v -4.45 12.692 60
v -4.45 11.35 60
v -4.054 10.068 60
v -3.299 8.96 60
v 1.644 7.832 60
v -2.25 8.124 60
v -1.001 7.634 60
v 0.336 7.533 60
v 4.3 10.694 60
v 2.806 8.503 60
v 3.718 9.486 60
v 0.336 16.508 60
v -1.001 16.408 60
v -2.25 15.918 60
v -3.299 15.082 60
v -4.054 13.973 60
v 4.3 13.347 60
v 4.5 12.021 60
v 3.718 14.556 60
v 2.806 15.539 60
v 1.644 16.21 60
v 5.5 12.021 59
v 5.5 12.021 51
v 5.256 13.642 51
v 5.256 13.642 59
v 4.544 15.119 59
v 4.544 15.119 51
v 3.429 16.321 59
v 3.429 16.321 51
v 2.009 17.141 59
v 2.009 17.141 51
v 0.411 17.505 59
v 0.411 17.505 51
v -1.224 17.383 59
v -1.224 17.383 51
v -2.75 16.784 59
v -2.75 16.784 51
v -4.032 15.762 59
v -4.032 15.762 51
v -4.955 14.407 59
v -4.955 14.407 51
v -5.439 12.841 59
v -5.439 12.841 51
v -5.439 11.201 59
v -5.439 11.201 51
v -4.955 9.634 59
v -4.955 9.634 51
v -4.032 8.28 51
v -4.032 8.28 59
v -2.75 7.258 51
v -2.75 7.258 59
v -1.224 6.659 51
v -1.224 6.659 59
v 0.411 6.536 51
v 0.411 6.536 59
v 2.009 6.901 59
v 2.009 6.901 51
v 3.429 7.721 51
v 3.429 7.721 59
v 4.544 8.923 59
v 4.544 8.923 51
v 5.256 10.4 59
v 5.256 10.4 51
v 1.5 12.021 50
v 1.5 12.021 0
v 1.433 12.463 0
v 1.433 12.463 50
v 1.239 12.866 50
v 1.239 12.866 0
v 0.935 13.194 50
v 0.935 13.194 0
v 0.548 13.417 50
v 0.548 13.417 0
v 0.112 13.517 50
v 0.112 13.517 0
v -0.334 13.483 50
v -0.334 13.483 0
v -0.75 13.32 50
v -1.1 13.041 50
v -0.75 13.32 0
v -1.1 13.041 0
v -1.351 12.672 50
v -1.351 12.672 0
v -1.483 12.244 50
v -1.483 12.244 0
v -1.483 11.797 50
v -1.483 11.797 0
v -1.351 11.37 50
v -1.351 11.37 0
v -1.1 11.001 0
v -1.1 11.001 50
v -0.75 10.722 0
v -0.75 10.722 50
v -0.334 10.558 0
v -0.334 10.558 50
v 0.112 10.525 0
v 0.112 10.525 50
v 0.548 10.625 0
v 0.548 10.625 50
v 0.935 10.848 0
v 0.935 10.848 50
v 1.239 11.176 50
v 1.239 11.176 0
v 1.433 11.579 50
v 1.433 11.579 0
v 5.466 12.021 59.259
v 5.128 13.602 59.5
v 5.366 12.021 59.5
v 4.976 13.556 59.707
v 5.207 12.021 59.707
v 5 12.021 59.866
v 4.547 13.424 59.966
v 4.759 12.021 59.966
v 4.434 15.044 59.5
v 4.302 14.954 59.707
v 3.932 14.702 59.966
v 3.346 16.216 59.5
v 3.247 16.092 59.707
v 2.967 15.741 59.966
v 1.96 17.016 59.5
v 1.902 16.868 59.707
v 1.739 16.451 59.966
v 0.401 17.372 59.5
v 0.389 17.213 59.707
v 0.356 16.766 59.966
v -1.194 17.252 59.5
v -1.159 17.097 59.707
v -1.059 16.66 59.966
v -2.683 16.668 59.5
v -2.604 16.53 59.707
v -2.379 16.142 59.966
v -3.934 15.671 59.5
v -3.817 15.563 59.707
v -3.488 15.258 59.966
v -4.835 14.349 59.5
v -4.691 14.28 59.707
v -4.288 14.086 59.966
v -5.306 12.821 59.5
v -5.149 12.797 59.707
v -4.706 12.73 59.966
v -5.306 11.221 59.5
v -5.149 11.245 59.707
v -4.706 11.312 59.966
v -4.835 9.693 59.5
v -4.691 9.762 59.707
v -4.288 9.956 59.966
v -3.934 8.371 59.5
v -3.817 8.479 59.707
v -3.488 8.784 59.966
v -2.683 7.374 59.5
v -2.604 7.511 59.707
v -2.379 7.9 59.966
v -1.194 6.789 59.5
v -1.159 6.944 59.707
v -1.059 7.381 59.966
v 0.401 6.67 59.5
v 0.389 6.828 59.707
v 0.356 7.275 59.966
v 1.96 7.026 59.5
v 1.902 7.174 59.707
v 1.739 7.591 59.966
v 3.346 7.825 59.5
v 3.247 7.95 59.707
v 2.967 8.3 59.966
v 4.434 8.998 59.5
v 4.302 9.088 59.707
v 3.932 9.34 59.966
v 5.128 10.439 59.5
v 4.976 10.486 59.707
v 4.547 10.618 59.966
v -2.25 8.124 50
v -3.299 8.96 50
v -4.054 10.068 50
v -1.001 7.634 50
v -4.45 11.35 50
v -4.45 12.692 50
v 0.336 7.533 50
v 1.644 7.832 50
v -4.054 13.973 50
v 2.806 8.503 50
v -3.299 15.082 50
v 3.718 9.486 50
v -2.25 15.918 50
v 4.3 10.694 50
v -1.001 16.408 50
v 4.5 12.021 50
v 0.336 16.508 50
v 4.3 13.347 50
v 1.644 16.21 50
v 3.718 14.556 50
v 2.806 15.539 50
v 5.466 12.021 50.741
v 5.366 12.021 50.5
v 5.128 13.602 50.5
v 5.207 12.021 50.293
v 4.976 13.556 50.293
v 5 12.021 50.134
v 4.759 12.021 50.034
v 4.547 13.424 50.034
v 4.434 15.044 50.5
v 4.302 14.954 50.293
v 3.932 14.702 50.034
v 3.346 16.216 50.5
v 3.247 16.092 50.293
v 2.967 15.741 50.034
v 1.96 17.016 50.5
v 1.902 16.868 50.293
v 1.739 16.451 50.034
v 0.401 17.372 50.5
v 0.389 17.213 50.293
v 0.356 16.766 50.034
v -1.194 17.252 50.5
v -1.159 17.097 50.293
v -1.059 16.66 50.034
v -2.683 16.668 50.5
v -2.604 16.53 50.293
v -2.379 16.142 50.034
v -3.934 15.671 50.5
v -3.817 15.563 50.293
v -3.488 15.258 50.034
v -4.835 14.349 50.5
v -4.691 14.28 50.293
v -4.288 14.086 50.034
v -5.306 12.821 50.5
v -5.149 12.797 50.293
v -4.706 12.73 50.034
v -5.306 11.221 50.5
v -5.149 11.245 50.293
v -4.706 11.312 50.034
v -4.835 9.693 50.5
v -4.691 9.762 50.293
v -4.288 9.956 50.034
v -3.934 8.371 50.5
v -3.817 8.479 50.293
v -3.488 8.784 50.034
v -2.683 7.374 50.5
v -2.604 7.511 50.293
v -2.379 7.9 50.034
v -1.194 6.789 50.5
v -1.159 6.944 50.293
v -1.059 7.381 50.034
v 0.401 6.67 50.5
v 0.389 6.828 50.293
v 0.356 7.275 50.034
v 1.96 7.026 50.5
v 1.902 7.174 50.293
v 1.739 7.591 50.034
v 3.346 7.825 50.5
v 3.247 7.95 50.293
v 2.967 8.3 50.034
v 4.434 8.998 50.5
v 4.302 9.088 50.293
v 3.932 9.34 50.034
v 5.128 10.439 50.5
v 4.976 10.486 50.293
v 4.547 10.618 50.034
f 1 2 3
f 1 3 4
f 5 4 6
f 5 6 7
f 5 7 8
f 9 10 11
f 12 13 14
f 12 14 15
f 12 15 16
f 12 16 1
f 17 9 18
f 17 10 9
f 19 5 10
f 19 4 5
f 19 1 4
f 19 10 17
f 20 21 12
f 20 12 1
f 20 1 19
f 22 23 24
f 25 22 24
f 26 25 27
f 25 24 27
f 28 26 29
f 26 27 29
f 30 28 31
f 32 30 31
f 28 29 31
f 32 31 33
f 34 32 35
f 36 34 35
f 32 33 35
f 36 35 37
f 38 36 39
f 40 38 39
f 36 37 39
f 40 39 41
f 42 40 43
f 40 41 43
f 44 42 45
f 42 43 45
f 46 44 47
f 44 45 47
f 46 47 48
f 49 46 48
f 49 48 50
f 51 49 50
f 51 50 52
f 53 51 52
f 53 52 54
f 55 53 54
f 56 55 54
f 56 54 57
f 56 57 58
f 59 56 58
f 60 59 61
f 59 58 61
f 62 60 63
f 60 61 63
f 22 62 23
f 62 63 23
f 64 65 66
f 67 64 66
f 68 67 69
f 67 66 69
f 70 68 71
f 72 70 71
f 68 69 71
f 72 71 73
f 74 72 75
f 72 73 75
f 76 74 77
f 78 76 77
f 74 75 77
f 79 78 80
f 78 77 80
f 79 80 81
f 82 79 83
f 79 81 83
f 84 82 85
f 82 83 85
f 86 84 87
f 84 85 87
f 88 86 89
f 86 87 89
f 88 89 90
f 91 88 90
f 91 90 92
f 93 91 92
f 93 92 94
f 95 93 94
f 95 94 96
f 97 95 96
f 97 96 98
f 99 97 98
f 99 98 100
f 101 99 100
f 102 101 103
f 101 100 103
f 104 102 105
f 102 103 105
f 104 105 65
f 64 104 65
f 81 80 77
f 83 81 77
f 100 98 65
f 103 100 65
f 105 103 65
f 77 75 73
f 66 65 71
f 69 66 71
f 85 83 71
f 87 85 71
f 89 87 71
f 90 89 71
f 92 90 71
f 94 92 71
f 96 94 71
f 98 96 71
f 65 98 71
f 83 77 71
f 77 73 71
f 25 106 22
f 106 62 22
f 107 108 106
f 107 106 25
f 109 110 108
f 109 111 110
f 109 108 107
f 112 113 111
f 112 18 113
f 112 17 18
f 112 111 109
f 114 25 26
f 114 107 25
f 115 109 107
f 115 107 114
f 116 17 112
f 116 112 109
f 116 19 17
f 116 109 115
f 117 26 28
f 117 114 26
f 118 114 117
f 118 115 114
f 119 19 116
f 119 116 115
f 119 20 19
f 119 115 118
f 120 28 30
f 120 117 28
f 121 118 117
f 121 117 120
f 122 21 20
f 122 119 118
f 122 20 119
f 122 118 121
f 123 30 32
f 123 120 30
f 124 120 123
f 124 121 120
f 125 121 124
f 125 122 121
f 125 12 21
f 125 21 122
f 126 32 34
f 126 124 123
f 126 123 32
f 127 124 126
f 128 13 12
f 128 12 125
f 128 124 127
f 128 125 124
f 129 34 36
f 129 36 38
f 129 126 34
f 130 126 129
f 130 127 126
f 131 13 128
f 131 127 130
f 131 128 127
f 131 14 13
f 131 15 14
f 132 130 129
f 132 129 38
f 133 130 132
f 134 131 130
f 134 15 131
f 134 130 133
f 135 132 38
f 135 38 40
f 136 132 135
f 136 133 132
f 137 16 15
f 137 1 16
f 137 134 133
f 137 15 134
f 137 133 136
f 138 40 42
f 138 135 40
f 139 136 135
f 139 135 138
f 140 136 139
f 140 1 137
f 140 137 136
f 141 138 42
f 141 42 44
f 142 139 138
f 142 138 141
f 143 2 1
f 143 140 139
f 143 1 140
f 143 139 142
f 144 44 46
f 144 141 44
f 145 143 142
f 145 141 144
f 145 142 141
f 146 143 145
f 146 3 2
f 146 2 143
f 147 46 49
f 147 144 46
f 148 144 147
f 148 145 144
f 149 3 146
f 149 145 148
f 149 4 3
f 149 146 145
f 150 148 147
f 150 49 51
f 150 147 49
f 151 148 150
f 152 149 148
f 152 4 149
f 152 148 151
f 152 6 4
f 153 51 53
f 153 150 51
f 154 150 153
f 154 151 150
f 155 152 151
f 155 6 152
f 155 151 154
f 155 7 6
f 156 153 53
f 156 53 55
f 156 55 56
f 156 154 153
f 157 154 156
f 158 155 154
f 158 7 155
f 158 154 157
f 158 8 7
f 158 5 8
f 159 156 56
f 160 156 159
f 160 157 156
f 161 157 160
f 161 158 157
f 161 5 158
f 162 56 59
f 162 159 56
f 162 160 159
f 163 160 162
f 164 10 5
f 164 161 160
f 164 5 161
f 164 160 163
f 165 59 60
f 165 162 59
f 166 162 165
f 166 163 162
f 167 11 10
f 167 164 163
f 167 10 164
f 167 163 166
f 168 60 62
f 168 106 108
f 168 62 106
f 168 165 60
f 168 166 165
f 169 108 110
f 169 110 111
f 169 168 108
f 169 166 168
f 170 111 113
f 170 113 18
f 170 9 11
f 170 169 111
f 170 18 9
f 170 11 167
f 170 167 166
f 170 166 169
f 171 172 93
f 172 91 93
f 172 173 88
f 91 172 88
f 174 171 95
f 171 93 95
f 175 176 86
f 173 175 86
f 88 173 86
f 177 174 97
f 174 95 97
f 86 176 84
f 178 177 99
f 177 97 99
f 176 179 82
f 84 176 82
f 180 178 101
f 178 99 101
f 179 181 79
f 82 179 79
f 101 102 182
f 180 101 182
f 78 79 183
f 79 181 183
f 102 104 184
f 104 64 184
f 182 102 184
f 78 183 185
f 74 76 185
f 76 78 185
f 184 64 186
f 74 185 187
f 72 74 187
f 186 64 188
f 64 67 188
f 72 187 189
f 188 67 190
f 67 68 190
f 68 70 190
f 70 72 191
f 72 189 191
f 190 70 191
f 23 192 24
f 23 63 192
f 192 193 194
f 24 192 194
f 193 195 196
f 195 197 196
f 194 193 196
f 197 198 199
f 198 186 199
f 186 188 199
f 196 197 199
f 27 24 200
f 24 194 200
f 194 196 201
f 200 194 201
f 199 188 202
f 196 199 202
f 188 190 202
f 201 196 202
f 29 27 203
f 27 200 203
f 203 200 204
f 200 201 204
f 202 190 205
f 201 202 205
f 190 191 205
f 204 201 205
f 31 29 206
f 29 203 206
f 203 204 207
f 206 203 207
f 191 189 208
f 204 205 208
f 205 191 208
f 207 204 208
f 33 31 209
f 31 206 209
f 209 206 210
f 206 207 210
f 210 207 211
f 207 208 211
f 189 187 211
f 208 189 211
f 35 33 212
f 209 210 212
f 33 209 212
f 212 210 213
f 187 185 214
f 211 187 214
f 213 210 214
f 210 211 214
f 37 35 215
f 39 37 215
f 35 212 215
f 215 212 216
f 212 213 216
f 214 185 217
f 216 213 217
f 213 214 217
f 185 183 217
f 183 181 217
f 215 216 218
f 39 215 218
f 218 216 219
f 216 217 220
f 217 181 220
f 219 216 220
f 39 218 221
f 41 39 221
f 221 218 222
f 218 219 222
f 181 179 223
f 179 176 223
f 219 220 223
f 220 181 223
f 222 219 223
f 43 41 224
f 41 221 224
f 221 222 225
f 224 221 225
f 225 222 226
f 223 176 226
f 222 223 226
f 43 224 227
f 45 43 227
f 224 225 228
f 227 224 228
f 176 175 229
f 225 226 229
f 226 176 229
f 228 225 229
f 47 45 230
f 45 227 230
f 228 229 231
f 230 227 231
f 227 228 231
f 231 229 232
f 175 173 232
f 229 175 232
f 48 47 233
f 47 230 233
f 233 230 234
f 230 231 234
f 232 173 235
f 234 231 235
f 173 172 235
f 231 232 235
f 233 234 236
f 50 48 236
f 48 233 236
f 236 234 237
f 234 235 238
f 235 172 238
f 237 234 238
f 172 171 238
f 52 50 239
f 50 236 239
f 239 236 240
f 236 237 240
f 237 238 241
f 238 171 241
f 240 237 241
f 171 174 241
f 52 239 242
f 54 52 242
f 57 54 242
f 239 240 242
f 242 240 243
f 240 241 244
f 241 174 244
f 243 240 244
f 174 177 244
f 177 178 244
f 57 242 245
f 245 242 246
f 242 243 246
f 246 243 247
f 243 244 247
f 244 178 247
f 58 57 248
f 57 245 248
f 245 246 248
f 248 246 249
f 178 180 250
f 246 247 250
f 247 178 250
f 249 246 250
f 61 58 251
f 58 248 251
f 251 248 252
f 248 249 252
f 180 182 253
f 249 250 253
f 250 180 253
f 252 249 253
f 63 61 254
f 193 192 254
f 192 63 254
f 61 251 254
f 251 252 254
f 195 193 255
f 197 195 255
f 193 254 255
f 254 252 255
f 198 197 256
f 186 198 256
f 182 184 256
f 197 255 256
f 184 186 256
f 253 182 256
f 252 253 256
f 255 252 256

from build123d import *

# Parameters (mm, degrees)
SKETCH1_R           = 1.5
BOSS_EXTRUDE1_DEPTH = 50
SKETCH2_R           = 5.5
BOSS_EXTRUDE2_DEPTH = 10
FILLET1_R           = 1


with BuildPart() as part:
    # Sketch1 → Boss-Extrude1 (new body)
    with BuildSketch(Plane.XY):
        with Locations((0, 12.02081528)):
            Circle(SKETCH1_R)
    extrude(amount=BOSS_EXTRUDE1_DEPTH)

    # Sketch2 → Boss-Extrude2 (add)
    with BuildSketch(Plane.XY.offset(50)):
        with Locations((0, 12.02081528)):
            Circle(SKETCH2_R)
    extrude(amount=BOSS_EXTRUDE2_DEPTH)

    # Fillet1
    fillet1_edges = [part.edges().sort_by_distance(p)[0] for p in [
        (-5.5, 12.02081528, 50),
        (-5.5, 12.02081528, 60),
    ]]
    fillet(fillet1_edges, radius=FILLET1_R)


solid = part.part
